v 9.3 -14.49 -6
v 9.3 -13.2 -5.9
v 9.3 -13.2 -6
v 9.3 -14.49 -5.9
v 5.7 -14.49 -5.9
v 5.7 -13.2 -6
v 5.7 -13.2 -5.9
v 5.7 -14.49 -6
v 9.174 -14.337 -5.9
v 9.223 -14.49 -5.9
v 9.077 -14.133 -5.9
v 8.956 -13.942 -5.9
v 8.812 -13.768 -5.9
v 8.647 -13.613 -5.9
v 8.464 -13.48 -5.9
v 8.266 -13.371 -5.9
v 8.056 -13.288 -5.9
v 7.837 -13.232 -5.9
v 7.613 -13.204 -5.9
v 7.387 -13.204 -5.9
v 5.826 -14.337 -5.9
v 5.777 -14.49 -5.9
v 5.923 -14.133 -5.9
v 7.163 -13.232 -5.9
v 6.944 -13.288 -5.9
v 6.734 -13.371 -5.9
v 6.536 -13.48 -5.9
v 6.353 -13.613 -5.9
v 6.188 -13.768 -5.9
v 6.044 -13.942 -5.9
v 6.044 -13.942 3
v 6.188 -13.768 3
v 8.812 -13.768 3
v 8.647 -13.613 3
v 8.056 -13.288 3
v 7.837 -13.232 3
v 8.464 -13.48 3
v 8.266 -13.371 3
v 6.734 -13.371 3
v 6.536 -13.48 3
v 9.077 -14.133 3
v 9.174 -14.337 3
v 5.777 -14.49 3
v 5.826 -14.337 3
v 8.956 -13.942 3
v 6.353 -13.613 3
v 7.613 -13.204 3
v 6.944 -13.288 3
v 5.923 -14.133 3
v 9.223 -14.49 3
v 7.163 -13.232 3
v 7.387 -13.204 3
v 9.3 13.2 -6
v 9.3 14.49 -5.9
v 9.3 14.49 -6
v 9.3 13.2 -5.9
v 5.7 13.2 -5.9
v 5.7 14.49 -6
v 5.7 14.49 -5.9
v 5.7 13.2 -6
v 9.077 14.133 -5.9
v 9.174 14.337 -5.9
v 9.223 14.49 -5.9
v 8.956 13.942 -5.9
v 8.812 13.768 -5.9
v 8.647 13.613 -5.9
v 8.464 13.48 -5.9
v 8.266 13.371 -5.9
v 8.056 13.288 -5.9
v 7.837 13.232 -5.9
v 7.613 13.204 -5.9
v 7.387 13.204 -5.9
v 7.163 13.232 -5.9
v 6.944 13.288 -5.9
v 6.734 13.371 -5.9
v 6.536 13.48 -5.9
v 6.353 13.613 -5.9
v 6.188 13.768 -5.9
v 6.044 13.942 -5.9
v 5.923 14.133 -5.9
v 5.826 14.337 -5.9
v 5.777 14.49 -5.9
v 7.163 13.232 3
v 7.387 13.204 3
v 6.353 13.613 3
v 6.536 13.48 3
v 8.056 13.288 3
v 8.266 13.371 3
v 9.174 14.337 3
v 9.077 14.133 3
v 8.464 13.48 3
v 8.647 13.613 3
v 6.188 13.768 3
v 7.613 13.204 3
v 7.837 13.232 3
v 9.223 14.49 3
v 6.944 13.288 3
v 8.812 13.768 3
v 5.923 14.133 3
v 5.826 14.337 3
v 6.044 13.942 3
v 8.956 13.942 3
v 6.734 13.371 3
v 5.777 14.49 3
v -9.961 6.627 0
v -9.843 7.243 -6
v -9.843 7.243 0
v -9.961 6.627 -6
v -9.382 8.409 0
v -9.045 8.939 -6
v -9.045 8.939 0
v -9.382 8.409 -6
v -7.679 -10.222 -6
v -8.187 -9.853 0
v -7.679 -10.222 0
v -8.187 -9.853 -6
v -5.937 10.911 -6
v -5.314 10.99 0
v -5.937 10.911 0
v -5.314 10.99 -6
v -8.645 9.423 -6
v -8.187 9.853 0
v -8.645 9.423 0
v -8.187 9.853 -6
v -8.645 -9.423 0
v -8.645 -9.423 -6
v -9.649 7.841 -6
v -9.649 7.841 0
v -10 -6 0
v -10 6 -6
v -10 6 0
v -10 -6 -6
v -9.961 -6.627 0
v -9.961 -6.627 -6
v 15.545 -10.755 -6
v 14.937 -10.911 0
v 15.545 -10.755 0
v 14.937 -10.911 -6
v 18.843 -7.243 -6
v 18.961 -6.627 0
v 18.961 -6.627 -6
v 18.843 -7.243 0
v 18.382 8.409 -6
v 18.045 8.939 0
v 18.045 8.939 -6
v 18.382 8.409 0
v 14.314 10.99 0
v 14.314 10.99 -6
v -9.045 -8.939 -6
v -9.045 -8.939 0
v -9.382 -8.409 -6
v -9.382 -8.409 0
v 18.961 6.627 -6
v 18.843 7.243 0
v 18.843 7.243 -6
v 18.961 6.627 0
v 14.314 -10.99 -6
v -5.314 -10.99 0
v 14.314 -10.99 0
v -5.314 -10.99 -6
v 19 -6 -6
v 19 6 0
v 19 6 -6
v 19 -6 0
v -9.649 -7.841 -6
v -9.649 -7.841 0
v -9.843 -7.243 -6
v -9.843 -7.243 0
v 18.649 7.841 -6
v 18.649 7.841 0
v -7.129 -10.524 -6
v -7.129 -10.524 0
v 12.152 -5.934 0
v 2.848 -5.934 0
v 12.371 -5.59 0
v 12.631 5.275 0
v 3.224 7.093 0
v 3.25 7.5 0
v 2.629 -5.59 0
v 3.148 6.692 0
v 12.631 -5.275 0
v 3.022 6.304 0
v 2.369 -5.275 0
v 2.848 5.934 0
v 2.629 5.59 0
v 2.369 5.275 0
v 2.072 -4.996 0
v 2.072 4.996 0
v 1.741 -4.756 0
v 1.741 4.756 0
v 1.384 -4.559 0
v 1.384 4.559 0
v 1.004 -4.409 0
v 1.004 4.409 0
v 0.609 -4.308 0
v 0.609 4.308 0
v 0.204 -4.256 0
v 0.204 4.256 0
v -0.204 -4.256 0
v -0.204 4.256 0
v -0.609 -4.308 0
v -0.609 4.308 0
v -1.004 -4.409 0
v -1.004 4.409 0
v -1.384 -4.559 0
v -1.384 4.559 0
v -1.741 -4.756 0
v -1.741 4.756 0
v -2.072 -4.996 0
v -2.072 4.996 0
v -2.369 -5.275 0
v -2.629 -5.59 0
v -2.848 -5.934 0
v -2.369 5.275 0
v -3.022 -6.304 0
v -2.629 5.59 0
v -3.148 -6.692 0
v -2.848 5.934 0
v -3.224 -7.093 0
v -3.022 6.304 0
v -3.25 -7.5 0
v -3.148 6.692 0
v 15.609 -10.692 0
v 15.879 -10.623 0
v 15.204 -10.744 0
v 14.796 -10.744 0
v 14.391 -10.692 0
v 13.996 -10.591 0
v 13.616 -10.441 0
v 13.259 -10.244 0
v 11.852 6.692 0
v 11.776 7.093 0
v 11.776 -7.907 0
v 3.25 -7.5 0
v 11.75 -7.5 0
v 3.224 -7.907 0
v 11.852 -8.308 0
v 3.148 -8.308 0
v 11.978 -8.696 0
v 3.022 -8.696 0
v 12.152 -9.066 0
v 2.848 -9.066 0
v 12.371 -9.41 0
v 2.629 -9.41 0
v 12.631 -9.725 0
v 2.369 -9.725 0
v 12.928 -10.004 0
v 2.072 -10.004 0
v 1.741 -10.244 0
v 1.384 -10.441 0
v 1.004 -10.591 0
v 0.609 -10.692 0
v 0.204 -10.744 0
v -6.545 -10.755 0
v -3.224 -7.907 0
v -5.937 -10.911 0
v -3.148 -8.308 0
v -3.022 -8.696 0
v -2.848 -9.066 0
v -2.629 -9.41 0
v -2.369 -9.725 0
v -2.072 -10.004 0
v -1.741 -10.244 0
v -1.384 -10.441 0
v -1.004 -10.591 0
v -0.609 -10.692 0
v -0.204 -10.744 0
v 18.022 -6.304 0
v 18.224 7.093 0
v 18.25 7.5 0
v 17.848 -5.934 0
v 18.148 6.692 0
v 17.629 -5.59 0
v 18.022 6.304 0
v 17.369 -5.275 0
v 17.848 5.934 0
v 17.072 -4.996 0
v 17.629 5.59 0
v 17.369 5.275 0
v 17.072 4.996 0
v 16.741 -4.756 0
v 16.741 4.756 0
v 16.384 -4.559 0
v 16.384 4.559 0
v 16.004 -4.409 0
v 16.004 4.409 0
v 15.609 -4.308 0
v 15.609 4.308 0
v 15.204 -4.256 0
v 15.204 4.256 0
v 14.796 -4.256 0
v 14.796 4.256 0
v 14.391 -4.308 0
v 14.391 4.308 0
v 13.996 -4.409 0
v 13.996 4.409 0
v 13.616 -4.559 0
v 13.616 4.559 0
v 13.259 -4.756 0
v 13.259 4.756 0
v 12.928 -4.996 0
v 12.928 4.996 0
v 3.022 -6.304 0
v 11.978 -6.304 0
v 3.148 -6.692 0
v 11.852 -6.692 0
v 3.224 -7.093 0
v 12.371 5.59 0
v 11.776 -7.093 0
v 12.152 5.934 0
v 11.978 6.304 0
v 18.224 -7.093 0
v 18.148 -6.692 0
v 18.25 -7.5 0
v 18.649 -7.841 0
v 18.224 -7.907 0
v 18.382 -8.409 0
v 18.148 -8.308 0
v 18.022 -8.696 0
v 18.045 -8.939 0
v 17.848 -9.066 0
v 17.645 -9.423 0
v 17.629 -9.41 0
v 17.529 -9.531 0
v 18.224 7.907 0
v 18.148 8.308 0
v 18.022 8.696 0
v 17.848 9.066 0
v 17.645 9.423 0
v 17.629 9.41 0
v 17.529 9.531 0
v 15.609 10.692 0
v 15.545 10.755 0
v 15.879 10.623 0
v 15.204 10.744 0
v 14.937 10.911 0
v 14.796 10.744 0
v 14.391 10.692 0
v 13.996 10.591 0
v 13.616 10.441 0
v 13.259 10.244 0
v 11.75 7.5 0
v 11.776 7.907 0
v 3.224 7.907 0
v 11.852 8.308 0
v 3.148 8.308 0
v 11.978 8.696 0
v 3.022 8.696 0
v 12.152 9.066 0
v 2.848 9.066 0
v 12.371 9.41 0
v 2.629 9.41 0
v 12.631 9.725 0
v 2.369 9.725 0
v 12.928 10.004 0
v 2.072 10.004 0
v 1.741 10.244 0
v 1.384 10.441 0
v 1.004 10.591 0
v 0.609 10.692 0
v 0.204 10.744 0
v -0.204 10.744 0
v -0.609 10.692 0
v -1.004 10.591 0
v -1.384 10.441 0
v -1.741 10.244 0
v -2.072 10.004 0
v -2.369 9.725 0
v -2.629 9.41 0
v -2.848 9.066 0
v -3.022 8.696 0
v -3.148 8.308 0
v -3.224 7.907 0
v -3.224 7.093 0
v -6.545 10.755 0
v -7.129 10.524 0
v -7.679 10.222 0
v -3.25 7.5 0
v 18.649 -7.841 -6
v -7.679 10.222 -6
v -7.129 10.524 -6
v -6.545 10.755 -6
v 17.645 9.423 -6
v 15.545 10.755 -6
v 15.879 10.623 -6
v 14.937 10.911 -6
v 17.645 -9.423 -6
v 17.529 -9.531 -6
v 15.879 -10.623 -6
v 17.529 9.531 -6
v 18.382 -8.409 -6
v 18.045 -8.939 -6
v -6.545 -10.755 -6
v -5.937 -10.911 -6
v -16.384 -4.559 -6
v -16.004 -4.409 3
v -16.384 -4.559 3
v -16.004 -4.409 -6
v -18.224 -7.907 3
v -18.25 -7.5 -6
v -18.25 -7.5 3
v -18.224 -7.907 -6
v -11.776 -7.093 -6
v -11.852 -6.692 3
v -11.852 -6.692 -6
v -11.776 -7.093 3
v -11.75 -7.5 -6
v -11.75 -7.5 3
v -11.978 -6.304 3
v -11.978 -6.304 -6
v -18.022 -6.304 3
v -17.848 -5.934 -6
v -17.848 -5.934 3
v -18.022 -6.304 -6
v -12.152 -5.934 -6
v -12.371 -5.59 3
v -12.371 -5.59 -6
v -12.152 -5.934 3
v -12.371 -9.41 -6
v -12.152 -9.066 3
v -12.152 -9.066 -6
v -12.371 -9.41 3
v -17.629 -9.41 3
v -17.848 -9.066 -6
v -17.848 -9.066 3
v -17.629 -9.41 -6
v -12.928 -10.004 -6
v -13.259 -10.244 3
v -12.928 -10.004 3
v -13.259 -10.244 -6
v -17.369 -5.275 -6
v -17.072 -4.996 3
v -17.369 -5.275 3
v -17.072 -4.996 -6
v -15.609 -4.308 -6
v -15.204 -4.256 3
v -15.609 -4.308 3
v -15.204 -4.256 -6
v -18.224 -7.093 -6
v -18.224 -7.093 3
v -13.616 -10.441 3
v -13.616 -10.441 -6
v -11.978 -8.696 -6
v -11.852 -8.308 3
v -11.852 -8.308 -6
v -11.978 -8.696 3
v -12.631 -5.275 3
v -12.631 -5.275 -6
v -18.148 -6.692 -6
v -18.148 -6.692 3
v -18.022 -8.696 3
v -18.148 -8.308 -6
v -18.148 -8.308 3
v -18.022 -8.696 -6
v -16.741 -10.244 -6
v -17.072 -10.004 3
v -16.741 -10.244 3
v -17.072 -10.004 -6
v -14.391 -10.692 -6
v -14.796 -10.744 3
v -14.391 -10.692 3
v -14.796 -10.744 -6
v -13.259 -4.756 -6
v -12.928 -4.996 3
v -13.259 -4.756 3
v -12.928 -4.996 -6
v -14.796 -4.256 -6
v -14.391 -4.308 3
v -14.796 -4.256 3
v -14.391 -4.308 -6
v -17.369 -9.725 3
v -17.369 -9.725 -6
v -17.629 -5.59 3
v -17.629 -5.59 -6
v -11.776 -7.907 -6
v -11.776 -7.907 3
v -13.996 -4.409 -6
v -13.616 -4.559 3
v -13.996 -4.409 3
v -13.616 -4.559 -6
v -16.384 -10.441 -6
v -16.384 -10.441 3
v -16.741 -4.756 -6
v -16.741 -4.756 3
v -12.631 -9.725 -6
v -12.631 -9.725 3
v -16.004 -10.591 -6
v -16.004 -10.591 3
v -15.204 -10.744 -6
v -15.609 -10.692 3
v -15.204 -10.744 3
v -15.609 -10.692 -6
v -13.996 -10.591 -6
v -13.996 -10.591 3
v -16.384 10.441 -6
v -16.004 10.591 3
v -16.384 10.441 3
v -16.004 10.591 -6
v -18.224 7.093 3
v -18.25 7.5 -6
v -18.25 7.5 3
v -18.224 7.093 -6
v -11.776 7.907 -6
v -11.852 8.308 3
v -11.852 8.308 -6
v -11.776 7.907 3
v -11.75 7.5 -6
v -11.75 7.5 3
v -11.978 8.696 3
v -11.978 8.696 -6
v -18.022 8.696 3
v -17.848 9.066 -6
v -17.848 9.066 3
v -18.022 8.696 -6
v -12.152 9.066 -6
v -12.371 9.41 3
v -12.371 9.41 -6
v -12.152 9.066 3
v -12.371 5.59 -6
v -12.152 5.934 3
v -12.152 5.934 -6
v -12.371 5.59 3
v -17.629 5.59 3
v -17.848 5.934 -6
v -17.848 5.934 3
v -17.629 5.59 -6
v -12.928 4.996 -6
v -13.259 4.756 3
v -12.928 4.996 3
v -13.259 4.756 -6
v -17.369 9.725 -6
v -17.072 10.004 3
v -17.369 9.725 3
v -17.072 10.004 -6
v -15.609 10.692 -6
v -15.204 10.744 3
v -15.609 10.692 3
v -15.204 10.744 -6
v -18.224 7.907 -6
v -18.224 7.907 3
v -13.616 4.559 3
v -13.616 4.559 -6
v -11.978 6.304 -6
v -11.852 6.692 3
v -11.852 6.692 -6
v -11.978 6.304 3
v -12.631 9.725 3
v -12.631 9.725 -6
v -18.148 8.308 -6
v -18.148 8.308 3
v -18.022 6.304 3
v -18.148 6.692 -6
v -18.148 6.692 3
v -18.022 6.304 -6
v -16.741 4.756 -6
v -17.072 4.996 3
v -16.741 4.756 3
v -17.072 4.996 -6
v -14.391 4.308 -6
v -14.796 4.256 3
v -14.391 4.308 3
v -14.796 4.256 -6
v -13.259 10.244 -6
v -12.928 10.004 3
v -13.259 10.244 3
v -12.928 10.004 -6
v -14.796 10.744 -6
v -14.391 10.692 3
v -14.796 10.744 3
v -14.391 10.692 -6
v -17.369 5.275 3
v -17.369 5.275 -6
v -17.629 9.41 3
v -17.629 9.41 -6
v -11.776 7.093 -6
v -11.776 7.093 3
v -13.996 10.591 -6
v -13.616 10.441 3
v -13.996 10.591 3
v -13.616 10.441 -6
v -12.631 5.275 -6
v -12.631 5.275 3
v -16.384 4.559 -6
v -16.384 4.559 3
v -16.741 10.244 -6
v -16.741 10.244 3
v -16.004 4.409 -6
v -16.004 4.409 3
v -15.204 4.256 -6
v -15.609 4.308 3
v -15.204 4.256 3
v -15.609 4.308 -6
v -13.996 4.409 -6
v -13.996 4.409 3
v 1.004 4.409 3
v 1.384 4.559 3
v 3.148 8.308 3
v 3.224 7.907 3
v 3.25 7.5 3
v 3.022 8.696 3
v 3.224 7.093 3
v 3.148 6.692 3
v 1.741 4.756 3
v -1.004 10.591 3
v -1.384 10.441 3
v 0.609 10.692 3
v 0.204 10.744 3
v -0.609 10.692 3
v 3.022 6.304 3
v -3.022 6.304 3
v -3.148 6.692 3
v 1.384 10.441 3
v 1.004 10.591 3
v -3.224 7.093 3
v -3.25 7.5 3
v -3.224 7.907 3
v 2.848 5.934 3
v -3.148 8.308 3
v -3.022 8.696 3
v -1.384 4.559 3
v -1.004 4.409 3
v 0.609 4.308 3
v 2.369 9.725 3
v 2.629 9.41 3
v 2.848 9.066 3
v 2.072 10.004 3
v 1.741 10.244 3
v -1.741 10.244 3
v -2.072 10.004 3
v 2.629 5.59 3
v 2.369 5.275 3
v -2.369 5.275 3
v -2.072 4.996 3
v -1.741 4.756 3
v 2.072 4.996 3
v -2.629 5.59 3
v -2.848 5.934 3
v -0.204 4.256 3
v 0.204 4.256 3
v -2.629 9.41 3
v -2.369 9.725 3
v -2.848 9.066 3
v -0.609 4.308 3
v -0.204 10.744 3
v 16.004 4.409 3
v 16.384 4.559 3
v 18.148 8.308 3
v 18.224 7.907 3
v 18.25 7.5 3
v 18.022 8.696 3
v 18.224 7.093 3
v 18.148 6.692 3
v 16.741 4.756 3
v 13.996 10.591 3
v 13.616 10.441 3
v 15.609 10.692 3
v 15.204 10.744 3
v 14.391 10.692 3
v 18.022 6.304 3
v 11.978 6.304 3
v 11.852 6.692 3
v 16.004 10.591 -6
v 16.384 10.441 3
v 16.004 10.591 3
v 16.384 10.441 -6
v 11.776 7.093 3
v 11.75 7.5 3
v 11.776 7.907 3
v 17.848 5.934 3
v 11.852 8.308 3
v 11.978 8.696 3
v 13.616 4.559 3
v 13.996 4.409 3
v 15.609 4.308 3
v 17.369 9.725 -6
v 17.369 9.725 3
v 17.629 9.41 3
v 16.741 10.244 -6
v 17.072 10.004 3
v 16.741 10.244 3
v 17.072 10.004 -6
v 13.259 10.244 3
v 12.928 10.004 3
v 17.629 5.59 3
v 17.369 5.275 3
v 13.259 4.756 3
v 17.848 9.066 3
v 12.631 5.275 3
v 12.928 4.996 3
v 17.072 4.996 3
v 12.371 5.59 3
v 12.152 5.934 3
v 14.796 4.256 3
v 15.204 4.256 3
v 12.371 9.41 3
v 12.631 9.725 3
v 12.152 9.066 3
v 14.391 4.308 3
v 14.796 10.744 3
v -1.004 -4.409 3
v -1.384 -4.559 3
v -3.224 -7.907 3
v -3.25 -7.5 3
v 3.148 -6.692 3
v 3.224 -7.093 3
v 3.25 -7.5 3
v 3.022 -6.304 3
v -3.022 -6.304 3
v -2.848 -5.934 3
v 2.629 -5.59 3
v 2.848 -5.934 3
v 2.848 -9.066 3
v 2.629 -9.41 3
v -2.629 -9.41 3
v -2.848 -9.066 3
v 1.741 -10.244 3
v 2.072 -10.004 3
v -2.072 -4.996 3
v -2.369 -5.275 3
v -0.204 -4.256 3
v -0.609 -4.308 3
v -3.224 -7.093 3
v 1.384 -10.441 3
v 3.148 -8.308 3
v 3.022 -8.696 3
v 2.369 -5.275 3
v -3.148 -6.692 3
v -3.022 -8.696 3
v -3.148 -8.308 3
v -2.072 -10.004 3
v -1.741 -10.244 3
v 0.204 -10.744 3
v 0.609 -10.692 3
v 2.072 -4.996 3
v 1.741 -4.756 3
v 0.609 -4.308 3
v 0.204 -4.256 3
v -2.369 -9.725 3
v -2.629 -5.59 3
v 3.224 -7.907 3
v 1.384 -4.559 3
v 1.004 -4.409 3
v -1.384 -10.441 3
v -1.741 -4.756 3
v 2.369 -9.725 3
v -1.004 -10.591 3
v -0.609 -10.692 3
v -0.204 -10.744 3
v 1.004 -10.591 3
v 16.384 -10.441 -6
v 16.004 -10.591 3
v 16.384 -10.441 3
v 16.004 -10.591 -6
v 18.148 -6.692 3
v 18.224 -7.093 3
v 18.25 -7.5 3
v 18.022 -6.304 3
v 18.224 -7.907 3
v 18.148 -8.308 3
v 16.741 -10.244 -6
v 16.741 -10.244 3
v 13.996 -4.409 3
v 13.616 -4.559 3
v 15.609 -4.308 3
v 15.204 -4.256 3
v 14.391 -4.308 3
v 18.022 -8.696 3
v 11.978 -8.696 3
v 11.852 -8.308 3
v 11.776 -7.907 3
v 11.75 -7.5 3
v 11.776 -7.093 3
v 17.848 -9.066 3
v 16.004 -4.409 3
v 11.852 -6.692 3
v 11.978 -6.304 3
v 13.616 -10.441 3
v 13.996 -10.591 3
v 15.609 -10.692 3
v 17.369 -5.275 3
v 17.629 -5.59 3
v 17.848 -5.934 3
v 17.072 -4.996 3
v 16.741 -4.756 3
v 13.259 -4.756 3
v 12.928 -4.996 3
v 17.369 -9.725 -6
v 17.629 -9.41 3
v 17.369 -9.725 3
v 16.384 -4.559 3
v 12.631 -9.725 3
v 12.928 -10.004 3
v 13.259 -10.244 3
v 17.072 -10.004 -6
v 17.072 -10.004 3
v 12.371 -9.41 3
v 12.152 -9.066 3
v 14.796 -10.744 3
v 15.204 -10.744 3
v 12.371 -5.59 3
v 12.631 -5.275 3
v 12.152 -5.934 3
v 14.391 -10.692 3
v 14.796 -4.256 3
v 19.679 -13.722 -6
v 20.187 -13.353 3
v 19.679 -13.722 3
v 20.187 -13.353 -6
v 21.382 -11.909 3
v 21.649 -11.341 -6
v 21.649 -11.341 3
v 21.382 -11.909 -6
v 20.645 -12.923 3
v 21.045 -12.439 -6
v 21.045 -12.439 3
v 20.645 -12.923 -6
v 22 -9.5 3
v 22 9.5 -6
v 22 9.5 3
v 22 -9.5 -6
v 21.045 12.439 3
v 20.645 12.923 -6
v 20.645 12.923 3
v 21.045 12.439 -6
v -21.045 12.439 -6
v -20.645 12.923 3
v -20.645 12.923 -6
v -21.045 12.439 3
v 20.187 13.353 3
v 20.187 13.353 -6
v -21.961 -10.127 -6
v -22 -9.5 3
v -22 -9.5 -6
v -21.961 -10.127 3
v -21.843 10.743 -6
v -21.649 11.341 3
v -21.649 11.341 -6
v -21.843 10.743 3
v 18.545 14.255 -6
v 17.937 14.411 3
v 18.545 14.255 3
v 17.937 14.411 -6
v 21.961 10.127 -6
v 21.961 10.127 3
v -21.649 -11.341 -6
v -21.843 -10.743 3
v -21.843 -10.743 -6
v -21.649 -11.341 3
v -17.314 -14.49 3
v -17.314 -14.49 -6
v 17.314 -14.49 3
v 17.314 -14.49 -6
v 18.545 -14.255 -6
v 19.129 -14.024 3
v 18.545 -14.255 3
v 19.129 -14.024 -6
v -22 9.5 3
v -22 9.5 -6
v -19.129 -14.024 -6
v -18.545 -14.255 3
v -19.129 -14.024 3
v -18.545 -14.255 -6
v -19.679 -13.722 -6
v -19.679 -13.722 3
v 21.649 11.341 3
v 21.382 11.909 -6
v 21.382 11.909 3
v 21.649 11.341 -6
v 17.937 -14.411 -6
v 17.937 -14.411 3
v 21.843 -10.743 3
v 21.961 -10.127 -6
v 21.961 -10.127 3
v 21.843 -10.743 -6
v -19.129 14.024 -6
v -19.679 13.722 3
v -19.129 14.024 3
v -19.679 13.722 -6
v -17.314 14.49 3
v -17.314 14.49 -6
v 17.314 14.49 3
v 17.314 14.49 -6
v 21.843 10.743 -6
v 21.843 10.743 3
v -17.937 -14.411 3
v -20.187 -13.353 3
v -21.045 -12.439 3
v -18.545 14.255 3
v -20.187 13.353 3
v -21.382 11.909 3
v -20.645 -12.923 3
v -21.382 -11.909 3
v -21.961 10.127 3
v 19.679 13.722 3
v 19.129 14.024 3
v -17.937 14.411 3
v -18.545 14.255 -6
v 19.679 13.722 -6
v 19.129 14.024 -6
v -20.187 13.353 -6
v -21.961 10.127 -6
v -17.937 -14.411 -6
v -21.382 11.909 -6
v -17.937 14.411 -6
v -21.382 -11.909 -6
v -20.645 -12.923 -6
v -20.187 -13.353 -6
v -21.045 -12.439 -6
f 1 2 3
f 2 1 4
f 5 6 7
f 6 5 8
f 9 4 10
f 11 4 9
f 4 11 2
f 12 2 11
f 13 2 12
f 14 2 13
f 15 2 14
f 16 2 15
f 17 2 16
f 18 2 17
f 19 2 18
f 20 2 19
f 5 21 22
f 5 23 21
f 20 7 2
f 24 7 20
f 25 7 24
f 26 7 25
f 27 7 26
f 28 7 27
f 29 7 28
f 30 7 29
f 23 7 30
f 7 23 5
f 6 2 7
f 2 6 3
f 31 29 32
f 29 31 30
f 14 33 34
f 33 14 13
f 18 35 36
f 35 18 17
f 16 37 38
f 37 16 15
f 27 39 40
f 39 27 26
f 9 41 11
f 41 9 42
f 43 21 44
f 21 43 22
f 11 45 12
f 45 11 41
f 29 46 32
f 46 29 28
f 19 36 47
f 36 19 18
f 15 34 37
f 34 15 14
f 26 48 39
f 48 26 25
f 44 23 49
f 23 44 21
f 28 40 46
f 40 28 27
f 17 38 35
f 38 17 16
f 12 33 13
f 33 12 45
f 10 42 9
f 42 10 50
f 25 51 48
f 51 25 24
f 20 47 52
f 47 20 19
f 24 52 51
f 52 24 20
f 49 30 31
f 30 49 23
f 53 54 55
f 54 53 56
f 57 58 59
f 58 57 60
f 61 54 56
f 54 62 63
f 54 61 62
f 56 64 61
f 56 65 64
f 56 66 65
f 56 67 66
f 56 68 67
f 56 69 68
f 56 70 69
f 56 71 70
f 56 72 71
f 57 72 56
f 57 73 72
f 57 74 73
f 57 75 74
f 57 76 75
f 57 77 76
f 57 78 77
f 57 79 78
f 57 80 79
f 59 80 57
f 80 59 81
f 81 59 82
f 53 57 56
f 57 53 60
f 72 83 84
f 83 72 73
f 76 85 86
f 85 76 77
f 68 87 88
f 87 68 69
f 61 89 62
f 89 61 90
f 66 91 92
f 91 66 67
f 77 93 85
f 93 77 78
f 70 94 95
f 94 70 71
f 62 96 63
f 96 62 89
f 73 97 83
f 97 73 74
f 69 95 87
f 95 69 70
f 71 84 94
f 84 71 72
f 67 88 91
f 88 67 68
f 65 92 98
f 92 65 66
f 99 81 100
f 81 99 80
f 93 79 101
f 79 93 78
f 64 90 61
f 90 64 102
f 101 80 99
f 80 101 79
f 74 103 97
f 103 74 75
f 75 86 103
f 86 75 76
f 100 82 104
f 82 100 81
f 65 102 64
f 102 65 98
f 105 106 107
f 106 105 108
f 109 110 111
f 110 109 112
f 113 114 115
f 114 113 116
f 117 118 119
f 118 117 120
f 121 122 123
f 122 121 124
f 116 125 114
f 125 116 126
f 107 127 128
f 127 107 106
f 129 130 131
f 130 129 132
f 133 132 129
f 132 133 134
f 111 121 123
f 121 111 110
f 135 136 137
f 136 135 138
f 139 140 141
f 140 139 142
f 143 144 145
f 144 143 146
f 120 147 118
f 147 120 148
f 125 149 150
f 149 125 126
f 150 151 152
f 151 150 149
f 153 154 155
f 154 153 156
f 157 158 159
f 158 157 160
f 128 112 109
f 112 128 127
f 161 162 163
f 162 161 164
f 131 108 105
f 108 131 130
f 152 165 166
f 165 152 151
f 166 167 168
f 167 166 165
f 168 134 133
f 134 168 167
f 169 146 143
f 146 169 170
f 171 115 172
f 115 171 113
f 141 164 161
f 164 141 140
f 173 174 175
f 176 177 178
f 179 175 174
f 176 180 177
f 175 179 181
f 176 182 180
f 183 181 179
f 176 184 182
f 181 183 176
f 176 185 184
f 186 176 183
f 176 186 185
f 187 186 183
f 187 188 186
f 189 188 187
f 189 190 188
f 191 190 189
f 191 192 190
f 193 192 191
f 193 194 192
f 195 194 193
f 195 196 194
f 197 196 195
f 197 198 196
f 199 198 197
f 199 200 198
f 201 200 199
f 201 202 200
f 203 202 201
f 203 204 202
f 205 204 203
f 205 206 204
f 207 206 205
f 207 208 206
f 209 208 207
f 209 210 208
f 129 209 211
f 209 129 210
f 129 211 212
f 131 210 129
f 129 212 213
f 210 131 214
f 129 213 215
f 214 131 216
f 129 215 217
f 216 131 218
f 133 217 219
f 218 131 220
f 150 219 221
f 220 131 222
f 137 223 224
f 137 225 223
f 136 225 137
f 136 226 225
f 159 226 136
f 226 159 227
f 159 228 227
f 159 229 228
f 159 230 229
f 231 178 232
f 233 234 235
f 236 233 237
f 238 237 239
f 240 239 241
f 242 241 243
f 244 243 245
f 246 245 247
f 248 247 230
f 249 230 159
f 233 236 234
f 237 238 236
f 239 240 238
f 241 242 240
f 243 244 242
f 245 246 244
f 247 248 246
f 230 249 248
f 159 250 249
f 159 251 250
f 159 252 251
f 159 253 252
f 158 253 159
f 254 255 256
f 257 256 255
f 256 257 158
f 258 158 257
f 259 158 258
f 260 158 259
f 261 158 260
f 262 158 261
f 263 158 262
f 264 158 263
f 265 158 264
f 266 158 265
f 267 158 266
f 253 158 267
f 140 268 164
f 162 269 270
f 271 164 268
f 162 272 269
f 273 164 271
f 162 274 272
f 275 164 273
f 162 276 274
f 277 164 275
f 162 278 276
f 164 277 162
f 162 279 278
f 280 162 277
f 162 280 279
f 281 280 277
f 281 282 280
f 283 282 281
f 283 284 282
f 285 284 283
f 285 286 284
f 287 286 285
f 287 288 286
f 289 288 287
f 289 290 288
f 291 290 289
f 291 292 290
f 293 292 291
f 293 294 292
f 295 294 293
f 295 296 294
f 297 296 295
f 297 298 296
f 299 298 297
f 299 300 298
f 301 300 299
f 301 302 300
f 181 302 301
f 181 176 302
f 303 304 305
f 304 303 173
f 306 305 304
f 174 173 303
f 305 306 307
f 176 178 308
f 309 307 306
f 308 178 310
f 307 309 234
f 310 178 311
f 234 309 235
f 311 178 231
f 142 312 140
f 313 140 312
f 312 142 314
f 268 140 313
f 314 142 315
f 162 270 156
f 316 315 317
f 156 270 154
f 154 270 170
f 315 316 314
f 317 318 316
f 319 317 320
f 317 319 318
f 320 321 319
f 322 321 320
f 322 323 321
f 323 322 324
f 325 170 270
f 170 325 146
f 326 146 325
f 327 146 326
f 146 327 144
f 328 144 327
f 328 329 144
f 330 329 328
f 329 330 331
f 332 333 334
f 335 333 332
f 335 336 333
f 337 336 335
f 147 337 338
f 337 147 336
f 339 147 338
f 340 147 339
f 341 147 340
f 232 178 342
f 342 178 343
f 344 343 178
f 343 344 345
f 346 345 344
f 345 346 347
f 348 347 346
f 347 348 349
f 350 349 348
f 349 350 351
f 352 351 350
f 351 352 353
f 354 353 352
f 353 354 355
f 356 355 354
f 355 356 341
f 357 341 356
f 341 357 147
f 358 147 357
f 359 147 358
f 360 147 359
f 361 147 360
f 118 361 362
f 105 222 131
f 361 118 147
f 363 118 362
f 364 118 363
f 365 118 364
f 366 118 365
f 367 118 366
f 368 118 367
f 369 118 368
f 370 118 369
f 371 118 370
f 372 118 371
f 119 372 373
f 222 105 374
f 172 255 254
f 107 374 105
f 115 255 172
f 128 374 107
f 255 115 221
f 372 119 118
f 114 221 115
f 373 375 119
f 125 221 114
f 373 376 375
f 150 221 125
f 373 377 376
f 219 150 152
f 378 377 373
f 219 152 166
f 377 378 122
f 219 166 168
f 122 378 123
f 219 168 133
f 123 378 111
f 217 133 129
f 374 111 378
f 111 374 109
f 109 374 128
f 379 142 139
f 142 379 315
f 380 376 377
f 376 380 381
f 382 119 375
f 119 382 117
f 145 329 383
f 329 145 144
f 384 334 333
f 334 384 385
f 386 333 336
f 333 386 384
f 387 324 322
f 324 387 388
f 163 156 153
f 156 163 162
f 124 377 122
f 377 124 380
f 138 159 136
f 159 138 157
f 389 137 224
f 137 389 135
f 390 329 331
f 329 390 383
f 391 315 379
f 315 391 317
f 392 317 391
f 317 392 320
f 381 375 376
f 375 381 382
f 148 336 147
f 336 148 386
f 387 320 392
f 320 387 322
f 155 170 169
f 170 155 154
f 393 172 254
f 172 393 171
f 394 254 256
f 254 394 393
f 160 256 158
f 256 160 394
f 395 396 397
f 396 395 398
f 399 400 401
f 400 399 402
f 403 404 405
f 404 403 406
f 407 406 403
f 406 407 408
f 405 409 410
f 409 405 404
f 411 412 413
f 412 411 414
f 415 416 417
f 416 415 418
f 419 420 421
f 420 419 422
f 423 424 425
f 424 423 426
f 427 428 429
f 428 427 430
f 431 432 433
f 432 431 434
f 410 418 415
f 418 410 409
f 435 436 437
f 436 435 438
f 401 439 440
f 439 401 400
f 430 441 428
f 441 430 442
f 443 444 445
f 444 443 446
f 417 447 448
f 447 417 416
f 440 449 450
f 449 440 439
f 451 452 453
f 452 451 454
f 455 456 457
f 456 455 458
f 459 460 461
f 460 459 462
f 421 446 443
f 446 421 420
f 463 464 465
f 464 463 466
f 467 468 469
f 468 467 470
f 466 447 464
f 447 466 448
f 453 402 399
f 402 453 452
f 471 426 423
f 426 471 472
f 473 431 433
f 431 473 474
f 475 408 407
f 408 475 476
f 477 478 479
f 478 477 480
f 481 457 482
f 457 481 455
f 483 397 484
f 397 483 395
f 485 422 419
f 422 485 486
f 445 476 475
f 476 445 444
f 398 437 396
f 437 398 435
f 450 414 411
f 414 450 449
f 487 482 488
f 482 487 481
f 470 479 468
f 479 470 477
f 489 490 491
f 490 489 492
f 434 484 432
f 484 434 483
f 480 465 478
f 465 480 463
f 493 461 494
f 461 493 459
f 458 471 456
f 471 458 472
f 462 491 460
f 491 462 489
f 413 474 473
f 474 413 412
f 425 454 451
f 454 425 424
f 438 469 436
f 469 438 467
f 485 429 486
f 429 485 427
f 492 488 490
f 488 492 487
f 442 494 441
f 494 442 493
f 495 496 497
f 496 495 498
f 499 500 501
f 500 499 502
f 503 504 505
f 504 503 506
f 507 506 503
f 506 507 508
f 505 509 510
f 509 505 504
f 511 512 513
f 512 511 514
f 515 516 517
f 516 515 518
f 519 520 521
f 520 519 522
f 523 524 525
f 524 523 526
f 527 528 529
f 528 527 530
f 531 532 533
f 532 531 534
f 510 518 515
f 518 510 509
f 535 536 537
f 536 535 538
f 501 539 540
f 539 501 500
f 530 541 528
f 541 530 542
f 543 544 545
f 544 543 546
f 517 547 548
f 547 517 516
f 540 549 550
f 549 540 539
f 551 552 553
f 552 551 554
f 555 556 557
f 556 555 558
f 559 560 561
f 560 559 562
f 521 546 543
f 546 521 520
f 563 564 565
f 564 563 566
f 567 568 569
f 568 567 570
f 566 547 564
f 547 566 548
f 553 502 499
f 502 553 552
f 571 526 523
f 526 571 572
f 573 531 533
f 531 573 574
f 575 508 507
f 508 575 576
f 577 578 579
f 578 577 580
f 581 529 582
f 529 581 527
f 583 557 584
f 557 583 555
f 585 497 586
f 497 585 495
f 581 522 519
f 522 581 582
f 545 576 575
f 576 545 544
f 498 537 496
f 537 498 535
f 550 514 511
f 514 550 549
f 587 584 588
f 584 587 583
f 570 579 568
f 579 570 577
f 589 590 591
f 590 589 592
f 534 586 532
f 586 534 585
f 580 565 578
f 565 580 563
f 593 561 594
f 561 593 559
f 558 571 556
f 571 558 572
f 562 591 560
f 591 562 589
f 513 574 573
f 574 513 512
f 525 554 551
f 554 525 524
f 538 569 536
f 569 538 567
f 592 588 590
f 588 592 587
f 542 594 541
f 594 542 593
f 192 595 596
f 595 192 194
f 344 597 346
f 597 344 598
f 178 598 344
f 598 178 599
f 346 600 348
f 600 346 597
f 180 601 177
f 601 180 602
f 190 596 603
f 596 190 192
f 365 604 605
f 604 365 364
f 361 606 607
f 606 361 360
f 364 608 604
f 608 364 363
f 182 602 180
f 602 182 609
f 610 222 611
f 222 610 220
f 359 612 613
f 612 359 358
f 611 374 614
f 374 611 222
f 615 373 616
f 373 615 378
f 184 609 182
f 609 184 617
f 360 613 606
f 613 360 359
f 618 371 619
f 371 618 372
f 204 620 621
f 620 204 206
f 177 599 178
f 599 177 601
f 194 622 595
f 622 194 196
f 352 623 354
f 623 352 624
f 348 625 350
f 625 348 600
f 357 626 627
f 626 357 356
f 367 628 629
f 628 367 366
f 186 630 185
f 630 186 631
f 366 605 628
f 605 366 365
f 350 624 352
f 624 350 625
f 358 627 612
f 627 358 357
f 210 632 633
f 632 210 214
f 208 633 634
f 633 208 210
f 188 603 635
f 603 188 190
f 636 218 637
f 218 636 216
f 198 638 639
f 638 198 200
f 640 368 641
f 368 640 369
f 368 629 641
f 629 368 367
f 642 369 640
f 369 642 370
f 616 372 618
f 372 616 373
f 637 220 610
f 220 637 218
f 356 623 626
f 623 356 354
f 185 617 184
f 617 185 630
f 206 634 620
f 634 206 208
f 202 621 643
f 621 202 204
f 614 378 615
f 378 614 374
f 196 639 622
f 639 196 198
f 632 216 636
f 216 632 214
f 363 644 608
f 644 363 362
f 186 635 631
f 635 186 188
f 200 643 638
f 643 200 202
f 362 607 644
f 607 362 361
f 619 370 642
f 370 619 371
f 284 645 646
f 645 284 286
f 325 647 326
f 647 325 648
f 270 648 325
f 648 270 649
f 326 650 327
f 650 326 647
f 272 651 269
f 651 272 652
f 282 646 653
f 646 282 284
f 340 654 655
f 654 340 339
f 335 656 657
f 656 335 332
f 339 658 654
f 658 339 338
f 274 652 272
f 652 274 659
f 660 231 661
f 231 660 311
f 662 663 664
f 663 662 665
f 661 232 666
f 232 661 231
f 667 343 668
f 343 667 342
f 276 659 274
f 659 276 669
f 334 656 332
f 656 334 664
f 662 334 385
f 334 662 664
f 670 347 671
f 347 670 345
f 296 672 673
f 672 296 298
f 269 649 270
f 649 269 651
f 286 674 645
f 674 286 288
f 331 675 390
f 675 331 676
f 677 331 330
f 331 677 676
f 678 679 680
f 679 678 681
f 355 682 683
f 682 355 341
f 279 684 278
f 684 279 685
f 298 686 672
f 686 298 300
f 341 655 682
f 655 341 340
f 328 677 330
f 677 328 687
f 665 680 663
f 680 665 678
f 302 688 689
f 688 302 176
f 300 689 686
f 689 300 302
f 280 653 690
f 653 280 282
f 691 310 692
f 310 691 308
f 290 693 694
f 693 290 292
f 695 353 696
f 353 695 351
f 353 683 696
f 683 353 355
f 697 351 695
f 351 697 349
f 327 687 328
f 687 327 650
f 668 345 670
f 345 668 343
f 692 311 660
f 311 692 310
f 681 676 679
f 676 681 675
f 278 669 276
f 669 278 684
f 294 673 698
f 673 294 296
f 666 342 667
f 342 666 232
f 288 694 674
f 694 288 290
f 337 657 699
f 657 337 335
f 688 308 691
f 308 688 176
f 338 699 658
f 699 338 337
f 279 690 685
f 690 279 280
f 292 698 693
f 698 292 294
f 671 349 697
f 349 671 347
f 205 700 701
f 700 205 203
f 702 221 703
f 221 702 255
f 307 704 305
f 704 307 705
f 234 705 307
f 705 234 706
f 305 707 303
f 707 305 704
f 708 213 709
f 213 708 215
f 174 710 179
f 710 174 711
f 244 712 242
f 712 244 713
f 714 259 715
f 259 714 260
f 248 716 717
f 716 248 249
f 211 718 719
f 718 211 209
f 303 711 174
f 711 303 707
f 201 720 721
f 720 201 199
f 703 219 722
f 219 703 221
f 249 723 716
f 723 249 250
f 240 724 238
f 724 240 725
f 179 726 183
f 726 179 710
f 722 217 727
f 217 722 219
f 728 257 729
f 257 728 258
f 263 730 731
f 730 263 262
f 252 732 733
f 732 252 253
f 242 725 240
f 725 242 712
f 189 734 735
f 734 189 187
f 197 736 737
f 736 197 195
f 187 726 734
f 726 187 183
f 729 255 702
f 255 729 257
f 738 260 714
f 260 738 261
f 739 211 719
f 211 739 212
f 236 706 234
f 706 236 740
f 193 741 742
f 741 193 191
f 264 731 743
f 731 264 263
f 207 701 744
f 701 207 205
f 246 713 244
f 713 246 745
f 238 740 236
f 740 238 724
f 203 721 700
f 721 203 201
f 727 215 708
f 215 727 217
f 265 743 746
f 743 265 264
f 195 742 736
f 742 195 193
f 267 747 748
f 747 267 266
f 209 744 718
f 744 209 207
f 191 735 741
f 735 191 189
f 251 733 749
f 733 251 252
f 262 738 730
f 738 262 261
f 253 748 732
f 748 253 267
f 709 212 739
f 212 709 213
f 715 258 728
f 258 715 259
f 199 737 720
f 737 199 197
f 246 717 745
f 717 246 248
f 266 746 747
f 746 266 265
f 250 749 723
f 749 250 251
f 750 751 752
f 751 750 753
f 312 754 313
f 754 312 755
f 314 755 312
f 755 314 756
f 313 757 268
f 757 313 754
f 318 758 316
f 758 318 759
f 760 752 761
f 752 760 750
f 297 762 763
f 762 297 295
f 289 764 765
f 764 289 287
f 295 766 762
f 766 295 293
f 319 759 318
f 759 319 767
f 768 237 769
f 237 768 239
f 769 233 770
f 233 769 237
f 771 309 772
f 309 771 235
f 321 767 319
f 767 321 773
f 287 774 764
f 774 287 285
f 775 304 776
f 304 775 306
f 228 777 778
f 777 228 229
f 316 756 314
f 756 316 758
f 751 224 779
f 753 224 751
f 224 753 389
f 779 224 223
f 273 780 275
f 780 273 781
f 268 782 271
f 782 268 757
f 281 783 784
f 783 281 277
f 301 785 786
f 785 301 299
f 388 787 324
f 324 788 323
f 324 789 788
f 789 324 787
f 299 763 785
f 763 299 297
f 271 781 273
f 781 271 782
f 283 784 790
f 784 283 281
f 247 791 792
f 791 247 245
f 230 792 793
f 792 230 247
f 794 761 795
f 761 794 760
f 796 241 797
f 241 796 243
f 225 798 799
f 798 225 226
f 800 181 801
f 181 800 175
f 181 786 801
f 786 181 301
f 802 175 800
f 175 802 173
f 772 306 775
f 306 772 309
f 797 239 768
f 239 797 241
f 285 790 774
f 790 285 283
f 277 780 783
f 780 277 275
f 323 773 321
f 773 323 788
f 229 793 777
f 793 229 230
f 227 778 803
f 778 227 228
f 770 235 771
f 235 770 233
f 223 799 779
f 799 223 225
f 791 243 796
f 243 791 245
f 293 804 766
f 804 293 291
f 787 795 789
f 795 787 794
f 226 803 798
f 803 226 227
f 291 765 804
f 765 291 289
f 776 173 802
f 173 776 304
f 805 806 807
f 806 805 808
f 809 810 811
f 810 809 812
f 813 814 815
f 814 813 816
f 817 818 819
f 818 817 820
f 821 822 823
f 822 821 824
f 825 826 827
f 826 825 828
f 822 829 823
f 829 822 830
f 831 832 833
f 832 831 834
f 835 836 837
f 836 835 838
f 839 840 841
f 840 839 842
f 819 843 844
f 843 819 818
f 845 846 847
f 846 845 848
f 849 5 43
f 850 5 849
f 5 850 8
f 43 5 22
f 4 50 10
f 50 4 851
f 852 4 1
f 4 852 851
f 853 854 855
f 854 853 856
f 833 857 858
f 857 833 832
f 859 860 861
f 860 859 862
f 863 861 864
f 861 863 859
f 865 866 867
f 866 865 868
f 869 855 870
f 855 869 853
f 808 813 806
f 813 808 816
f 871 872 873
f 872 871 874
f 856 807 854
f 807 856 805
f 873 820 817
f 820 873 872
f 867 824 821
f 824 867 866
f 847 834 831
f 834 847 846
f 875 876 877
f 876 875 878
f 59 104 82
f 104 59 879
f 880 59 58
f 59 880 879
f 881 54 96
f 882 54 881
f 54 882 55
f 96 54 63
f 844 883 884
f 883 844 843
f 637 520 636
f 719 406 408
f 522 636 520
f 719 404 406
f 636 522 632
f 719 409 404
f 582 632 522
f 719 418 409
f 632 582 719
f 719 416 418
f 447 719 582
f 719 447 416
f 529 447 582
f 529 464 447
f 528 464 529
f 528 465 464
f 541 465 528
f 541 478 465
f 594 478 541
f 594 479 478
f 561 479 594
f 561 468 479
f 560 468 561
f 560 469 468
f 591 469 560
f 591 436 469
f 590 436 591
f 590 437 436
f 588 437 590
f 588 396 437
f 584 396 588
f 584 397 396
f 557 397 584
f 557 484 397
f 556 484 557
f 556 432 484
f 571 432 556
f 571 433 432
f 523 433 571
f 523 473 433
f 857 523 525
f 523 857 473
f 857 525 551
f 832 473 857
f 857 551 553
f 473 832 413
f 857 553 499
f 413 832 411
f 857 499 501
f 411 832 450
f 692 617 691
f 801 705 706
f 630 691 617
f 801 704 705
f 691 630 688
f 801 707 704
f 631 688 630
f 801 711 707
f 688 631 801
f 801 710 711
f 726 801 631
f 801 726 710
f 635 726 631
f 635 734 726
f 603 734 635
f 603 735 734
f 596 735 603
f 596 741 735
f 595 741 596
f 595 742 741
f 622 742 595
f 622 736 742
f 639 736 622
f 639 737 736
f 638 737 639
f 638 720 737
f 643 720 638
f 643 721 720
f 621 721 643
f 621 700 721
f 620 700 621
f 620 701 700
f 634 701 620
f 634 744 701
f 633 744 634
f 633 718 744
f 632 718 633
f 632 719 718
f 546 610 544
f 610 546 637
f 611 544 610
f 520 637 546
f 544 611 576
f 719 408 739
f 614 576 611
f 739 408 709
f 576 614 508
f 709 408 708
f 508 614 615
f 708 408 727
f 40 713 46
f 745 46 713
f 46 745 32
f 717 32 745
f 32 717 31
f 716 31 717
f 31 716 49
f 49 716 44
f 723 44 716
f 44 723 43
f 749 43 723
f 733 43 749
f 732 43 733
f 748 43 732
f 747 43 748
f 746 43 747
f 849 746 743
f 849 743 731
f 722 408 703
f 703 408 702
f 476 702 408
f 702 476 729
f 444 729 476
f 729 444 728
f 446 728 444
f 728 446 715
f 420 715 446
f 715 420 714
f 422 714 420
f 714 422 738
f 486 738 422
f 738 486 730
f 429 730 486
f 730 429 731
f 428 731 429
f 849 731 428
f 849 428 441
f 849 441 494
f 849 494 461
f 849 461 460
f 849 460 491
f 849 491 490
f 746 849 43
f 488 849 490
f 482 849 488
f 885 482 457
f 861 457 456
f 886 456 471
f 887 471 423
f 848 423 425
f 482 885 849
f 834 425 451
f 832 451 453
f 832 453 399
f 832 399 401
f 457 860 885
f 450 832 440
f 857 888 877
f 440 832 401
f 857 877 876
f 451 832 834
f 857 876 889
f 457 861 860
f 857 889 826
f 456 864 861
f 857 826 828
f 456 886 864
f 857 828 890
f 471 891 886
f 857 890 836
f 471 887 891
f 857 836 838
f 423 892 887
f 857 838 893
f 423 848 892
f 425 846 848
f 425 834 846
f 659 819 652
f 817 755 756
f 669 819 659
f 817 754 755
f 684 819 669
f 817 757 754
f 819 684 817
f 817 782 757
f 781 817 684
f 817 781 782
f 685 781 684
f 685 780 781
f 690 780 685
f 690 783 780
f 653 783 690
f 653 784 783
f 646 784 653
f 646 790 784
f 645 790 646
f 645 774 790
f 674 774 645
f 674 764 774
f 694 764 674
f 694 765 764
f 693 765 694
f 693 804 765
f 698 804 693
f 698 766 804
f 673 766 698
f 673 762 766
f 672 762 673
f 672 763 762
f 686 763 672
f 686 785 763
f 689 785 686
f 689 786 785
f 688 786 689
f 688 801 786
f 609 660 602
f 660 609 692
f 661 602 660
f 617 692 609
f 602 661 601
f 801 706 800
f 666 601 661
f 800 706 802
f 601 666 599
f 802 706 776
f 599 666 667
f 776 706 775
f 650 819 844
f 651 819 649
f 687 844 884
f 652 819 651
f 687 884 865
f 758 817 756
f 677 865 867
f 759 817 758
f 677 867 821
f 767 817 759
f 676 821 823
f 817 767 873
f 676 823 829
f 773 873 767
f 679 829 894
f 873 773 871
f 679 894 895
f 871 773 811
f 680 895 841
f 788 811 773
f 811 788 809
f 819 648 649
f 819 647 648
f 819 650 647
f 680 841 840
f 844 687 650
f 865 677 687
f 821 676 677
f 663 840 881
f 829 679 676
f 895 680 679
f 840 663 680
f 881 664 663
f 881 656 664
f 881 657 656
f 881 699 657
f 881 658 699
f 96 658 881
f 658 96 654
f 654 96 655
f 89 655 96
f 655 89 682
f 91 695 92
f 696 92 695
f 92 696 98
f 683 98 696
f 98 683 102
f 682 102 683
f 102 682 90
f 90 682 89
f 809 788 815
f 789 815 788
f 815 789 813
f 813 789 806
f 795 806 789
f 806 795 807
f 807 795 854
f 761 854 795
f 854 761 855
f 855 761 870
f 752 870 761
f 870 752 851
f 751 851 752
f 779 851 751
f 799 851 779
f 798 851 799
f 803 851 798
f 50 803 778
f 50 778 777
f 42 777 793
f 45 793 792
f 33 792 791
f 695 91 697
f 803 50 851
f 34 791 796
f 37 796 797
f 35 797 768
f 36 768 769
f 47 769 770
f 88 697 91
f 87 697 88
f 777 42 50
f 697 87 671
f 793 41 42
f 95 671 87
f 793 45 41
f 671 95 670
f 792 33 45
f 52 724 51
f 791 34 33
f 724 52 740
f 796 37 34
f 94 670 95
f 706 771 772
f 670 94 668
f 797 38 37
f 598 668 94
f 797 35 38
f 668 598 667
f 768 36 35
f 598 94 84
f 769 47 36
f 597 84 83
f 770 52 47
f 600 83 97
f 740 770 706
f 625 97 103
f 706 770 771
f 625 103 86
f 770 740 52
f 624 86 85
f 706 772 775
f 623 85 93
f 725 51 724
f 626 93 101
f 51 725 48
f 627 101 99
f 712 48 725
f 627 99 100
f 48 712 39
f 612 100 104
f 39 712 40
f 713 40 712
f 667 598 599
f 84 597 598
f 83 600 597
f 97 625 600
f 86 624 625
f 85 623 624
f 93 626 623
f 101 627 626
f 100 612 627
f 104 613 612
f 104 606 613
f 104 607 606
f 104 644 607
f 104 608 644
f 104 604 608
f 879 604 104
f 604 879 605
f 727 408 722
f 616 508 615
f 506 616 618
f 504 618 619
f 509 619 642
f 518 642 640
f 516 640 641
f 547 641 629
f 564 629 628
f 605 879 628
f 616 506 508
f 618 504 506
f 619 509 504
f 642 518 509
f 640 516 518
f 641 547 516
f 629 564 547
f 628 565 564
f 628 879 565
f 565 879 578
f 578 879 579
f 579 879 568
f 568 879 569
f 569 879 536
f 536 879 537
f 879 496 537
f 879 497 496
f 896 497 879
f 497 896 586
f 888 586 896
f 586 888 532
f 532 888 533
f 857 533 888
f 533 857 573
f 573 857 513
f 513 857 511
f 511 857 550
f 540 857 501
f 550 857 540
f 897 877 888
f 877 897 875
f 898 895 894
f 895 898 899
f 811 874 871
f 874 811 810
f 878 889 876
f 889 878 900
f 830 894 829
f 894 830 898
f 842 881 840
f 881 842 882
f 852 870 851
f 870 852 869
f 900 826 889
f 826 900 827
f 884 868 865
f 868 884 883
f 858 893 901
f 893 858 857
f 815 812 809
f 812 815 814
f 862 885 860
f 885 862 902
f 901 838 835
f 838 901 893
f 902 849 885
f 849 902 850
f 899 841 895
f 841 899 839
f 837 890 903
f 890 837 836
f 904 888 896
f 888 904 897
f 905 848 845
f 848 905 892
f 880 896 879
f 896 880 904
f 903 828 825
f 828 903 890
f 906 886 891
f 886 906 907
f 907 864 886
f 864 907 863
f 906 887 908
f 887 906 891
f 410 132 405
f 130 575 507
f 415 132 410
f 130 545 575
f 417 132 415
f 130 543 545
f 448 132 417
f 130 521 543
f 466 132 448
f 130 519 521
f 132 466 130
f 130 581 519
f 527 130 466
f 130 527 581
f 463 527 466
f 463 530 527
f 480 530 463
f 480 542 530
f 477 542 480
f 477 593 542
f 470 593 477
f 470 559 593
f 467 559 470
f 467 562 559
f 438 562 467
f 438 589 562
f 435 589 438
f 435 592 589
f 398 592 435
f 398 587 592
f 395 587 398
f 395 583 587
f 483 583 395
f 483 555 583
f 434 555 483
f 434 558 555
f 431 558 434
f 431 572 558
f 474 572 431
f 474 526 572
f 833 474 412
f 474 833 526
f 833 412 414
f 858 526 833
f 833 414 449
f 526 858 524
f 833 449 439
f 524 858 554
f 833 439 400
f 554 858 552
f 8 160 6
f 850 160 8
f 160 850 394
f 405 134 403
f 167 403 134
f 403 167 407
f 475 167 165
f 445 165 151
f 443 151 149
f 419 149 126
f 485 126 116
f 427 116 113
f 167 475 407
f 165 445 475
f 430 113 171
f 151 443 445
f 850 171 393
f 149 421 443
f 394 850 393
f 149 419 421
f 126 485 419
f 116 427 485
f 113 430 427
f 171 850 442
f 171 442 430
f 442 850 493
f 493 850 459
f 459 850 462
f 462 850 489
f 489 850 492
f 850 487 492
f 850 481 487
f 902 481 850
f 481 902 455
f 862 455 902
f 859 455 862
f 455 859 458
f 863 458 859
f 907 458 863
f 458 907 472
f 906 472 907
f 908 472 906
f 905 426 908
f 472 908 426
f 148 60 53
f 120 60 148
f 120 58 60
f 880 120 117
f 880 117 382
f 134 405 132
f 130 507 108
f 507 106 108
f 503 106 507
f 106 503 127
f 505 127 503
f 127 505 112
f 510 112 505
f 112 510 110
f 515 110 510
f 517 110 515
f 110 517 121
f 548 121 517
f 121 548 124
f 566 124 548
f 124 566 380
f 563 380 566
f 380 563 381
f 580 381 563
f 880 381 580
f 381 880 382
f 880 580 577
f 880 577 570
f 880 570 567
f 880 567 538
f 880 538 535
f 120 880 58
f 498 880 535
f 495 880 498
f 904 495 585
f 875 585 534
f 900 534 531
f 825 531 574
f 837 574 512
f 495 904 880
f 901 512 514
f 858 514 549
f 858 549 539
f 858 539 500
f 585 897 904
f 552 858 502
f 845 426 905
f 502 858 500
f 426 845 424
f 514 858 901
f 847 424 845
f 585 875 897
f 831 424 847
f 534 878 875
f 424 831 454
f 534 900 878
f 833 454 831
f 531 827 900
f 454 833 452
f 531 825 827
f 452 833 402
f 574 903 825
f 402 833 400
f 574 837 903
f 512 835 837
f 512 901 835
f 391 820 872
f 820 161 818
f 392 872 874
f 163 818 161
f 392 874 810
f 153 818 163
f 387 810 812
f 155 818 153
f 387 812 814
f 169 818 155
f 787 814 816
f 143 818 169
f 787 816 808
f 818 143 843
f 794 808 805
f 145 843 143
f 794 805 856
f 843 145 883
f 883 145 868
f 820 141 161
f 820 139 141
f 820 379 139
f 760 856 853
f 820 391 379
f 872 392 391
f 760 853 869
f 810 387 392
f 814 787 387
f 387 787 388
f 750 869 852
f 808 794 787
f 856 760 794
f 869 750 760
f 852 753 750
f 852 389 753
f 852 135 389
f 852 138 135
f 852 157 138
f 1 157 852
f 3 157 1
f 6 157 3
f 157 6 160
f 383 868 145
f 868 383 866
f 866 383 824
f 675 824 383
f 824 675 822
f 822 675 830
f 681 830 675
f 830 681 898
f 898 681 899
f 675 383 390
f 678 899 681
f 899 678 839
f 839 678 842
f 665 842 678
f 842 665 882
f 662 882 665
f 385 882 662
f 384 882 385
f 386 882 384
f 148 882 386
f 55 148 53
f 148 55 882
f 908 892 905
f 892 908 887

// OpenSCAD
$fn = 50;


difference() {
	union() {
		*color(alpha = 1.0000000000, c = "gray") {
			translate(v = [0, 14, -6]) {
				linear_extrude(height = 2) {
					text(font = "Arial:style=Bold", halign = "center", size = 4.5000000000, text = "COMMENT description oobb_plate_shape_positive_type_9_depth_0_0_-6_pos_spacer_long_extra_9_thickness_3_width_2_height_0_0_-9_pos_plate", valign = "center");
				}
			}
		}
		translate(v = [0, 0, -6]) {
			hull() {
				translate(v = [-17.0000000000, 9.5000000000, 0]) {
					cylinder(h = 9, r = 5);
				}
				translate(v = [17.0000000000, 9.5000000000, 0]) {
					cylinder(h = 9, r = 5);
				}
				translate(v = [-17.0000000000, -9.5000000000, 0]) {
					cylinder(h = 9, r = 5);
				}
				translate(v = [17.0000000000, -9.5000000000, 0]) {
					cylinder(h = 9, r = 5);
				}
			}
		}
		*color(alpha = 1.0000000000, c = "gray") {
			translate(v = [0, 14, -9]) {
				linear_extrude(height = 2) {
					text(font = "Arial:style=Bold", halign = "center", size = 4.5000000000, text = "COMMENT description oobb_holes_shape_p_type_0_0_-9_pos_spacer_long_extra_9_thickness_3_width_2_height_0_0_-9_pos_plate_'left'_'right'_'top'_hole_sides_'left'_'right'_'top'_holes_true_both_holes", valign = "center");
				}
			}
		}
		*color(alpha = 1.0000000000, c = "gray") {
			translate(v = [0, 14, -3]) {
				rotate(a = [0, 0, 180]) {
					linear_extrude(height = 2) {
						text(font = "Arial:style=Bold", halign = "center", size = 4.5000000000, text = "COMMENT description oobb_wire_spacer_long_shape_0_0_-3_pos_spacer_long_extra_9_thickness_3_width_2_height_0_0_-9_pos_plate_0_0_180_rot", valign = "center");
					}
				}
			}
		}
	}
	union() {
		translate(v = [7.5000000000, -15, -9]) {
			rotate(a = [0, 0, 0]) {
				difference() {
					union() {
						#translate(v = [-1.8000000000, -3.0000000000, -0.3000000000]) {
							cube(size = [3.6000000000, 6.0000000000, 0.3000000000]);
						}
						#translate(v = [-1.8000000000, -1.8000000000, -0.6000000000]) {
							cube(size = [3.6000000000, 3.6000000000, 0.3000000000]);
						}
						#translate(v = [-1.8000000000, -3.0000000000, 2.5000000000]) {
							cube(size = [3.6000000000, 6.0000000000, 0.3000000000]);
						}
						#translate(v = [-1.8000000000, -1.8000000000, 2.8000000000]) {
							cube(size = [3.6000000000, 3.6000000000, 0.3000000000]);
						}
						#translate(v = [0, 0, -50.0000000000]) {
							cylinder(h = 100, r = 1.8000000000);
						}
						#linear_extrude(height = 2.5000000000) {
							polygon(points = [[3.4620000000, 0.0000000000], [1.7310000000, 2.9981799479], [-1.7310000000, 2.9981799479], [-3.4620000000, 0.0000000000], [-1.7310000000, -2.9981799479], [1.7310000000, -2.9981799479]]);
						}
						#translate(v = [-1.8000000000, -3.0000000000, -0.3000000000]) {
							cube(size = [3.6000000000, 6.0000000000, 0.3000000000]);
						}
						#translate(v = [-1.8000000000, -1.8000000000, -0.6000000000]) {
							cube(size = [3.6000000000, 3.6000000000, 0.3000000000]);
						}
						#translate(v = [-1.8000000000, -3.0000000000, 2.5000000000]) {
							cube(size = [3.6000000000, 6.0000000000, 0.3000000000]);
						}
						#translate(v = [-1.8000000000, -1.8000000000, 2.8000000000]) {
							cube(size = [3.6000000000, 3.6000000000, 0.3000000000]);
						}
						#translate(v = [0, 0, -50.0000000000]) {
							cylinder(h = 100, r = 1.8000000000);
						}
						#translate(v = [-1.8000000000, -3.0000000000, -0.3000000000]) {
							cube(size = [3.6000000000, 6.0000000000, 0.3000000000]);
						}
						#translate(v = [-1.8000000000, -1.8000000000, -0.6000000000]) {
							cube(size = [3.6000000000, 3.6000000000, 0.3000000000]);
						}
						#translate(v = [-1.8000000000, -3.0000000000, 2.5000000000]) {
							cube(size = [3.6000000000, 6.0000000000, 0.3000000000]);
						}
						#translate(v = [-1.8000000000, -1.8000000000, 2.8000000000]) {
							cube(size = [3.6000000000, 3.6000000000, 0.3000000000]);
						}
						#translate(v = [0, 0, -50.0000000000]) {
							cylinder(h = 100, r = 1.8000000000);
						}
					}
					union();
				}
			}
		}
		translate(v = [7.5000000000, 15, -9]) {
			rotate(a = [0, 0, 0]) {
				difference() {
					union() {
						#translate(v = [-1.8000000000, -3.0000000000, -0.3000000000]) {
							cube(size = [3.6000000000, 6.0000000000, 0.3000000000]);
						}
						#translate(v = [-1.8000000000, -1.8000000000, -0.6000000000]) {
							cube(size = [3.6000000000, 3.6000000000, 0.3000000000]);
						}
						#translate(v = [-1.8000000000, -3.0000000000, 2.5000000000]) {
							cube(size = [3.6000000000, 6.0000000000, 0.3000000000]);
						}
						#translate(v = [-1.8000000000, -1.8000000000, 2.8000000000]) {
							cube(size = [3.6000000000, 3.6000000000, 0.3000000000]);
						}
						#translate(v = [0, 0, -50.0000000000]) {
							cylinder(h = 100, r = 1.8000000000);
						}
						#linear_extrude(height = 2.5000000000) {
							polygon(points = [[3.4620000000, 0.0000000000], [1.7310000000, 2.9981799479], [-1.7310000000, 2.9981799479], [-3.4620000000, 0.0000000000], [-1.7310000000, -2.9981799479], [1.7310000000, -2.9981799479]]);
						}
						#translate(v = [-1.8000000000, -3.0000000000, -0.3000000000]) {
							cube(size = [3.6000000000, 6.0000000000, 0.3000000000]);
						}
						#translate(v = [-1.8000000000, -1.8000000000, -0.6000000000]) {
							cube(size = [3.6000000000, 3.6000000000, 0.3000000000]);
						}
						#translate(v = [-1.8000000000, -3.0000000000, 2.5000000000]) {
							cube(size = [3.6000000000, 6.0000000000, 0.3000000000]);
						}
						#translate(v = [-1.8000000000, -1.8000000000, 2.8000000000]) {
							cube(size = [3.6000000000, 3.6000000000, 0.3000000000]);
						}
						#translate(v = [0, 0, -50.0000000000]) {
							cylinder(h = 100, r = 1.8000000000);
						}
						#translate(v = [-1.8000000000, -3.0000000000, -0.3000000000]) {
							cube(size = [3.6000000000, 6.0000000000, 0.3000000000]);
						}
						#translate(v = [-1.8000000000, -1.8000000000, -0.6000000000]) {
							cube(size = [3.6000000000, 3.6000000000, 0.3000000000]);
						}
						#translate(v = [-1.8000000000, -3.0000000000, 2.5000000000]) {
							cube(size = [3.6000000000, 6.0000000000, 0.3000000000]);
						}
						#translate(v = [-1.8000000000, -1.8000000000, 2.8000000000]) {
							cube(size = [3.6000000000, 3.6000000000, 0.3000000000]);
						}
						#translate(v = [0, 0, -50.0000000000]) {
							cylinder(h = 100, r = 1.8000000000);
						}
					}
					union();
				}
			}
		}
		translate(v = [0, 0, -3]) {
			rotate(a = [0, 0, 180]) {
				difference() {
					union() {
						translate(v = [-4.5000000000, 0, -6]) {
							hull() {
								translate(v = [-9.5000000000, 6.0000000000, 0]) {
									cylinder(h = 9, r = 5);
								}
								translate(v = [9.5000000000, 6.0000000000, 0]) {
									cylinder(h = 9, r = 5);
								}
								translate(v = [-9.5000000000, -6.0000000000, 0]) {
									cylinder(h = 9, r = 5);
								}
								translate(v = [9.5000000000, -6.0000000000, 0]) {
									cylinder(h = 9, r = 5);
								}
							}
						}
					}
					union();
				}
			}
		}
		translate(v = [-15.0000000000, -7.5000000000, -50.0000000000]) {
			cylinder(h = 100, r = 3.2500000000);
		}
		translate(v = [-15.0000000000, 7.5000000000, -50.0000000000]) {
			cylinder(h = 100, r = 3.2500000000);
		}
		translate(v = [-15.0000000000, 7.5000000000, -50.0000000000]) {
			cylinder(h = 100, r = 3.2500000000);
		}
		translate(v = [0.0000000000, 7.5000000000, -50.0000000000]) {
			cylinder(h = 100, r = 3.2500000000);
		}
		translate(v = [15.0000000000, 7.5000000000, -50.0000000000]) {
			cylinder(h = 100, r = 3.2500000000);
		}
		translate(v = [-15.0000000000, -7.5000000000, -50.0000000000]) {
			cylinder(h = 100, r = 3.2500000000);
		}
		translate(v = [0.0000000000, -7.5000000000, -50.0000000000]) {
			cylinder(h = 100, r = 3.2500000000);
		}
		translate(v = [15.0000000000, -7.5000000000, -50.0000000000]) {
			cylinder(h = 100, r = 3.2500000000);
		}
		*color(alpha = 1.0000000000, c = "gray") {
			translate(v = [7.5000000000, -1, -9]) {
				linear_extrude(height = 2) {
					text(font = "Arial:style=Bold", halign = "center", size = 4.5000000000, text = "COMMENT description oobb_nut_shape_negative_type_m3_radius_name_7.5_-15_-9_pos_9_thickness_3_width_2_height_0_0_-9_pos_plate_bottom_zz_true_overhang_0_0_0_rot_false_nut_true_hole", valign = "center");
				}
			}
		}
		*color(alpha = 1.0000000000, c = "gray") {
			translate(v = [7.5000000000, 29, -9]) {
				linear_extrude(height = 2) {
					text(font = "Arial:style=Bold", halign = "center", size = 4.5000000000, text = "COMMENT description oobb_nut_shape_negative_type_m3_radius_name_7.5_15_-9_pos_9_thickness_3_width_2_height_0_0_-9_pos_plate_bottom_zz_true_overhang_0_0_0_rot_false_nut_true_hole", valign = "center");
				}
			}
		}
	}
}
